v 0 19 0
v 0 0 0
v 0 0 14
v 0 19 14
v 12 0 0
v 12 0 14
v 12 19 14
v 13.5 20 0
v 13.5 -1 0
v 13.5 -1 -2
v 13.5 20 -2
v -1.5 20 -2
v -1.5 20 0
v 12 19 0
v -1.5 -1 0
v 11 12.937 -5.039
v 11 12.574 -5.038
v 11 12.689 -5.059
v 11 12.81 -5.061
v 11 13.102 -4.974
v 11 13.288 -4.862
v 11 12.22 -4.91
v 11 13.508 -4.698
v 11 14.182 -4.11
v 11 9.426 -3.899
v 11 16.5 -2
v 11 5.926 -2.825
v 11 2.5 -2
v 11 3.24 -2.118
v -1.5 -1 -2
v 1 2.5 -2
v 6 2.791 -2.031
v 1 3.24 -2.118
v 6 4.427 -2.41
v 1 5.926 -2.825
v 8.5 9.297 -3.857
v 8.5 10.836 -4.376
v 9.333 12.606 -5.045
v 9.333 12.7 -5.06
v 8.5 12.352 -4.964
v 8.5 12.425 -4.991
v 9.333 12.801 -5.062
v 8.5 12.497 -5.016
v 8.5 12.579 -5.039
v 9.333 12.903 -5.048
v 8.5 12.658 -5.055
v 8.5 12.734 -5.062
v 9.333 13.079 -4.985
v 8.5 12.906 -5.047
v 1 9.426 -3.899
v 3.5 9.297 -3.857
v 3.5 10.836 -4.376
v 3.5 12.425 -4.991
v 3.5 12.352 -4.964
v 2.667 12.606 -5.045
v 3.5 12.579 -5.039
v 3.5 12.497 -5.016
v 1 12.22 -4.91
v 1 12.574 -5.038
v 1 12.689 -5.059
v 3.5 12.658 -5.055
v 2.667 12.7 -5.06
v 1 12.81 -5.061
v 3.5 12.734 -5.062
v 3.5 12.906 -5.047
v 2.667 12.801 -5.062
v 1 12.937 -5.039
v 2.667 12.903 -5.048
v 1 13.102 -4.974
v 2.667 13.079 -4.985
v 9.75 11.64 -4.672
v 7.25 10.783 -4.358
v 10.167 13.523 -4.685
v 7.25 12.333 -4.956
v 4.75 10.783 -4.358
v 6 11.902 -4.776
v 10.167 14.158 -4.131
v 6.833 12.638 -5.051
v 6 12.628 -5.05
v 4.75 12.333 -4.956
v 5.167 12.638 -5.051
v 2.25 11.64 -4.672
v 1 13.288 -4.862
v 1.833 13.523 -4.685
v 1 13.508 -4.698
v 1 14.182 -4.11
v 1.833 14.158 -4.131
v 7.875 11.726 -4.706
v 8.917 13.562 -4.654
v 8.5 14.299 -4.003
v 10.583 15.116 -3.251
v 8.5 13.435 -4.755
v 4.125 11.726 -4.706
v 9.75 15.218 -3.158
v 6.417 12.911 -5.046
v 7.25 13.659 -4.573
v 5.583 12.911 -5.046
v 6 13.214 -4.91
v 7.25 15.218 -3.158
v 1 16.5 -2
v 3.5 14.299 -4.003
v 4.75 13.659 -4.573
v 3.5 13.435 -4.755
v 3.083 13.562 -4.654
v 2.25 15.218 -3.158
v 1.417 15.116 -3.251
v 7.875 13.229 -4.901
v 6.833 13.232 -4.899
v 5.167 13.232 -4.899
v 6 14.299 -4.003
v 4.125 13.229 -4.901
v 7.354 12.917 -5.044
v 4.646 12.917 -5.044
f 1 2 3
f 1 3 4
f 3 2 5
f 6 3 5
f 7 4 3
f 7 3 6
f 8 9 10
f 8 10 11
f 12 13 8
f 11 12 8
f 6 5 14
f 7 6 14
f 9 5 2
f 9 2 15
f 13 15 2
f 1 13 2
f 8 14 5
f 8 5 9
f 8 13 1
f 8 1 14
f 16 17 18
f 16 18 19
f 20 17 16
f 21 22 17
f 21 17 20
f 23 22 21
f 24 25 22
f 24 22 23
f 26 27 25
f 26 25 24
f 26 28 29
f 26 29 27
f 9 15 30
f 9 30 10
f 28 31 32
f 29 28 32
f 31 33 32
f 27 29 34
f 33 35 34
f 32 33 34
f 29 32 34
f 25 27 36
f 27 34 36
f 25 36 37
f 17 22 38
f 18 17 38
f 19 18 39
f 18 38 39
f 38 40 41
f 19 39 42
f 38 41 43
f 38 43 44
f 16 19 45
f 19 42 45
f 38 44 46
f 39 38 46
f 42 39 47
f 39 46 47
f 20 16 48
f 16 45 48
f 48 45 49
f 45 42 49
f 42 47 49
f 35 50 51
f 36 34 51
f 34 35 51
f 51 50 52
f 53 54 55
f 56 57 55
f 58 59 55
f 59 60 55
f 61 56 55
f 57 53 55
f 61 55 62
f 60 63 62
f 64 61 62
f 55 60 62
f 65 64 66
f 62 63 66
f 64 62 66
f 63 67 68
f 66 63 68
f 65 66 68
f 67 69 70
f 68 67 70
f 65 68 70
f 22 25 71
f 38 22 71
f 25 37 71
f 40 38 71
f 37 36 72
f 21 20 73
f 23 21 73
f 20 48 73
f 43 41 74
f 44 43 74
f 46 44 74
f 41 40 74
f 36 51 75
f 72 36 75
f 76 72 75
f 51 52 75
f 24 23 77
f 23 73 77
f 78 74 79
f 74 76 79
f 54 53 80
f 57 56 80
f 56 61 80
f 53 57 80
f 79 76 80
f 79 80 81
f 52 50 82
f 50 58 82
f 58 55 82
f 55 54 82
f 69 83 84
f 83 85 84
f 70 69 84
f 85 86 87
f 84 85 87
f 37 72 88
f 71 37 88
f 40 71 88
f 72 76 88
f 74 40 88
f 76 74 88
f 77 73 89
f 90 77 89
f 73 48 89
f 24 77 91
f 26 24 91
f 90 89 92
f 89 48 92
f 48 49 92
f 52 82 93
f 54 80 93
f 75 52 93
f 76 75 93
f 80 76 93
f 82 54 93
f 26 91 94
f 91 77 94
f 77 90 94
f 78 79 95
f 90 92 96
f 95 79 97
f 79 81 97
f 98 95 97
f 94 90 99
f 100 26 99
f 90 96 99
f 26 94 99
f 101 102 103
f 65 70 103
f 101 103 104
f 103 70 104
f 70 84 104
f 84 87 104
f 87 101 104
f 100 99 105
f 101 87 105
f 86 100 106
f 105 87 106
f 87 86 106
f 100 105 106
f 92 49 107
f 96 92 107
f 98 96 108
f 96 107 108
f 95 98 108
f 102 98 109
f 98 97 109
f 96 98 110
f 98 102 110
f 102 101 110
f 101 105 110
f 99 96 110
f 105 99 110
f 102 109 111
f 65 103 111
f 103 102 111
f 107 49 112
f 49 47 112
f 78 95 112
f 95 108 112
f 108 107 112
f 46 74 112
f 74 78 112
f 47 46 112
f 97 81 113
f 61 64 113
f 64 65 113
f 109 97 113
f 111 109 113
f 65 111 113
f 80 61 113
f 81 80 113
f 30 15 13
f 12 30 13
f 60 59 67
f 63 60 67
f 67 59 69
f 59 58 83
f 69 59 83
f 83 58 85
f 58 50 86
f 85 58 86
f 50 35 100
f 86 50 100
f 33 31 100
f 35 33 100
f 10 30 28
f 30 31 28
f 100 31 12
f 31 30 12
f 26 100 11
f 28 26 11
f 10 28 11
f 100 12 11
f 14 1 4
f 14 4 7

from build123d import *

# Parameters (mm, degrees)
SKETCH1_W           = 12
SKETCH1_H           = 19
BOSS_EXTRUDE1_DEPTH = 14
SKETCH2_W           = 15
SKETCH2_H           = 21
BOSS_EXTRUDE2_DEPTH = 2
BOSS_EXTRUDE3_START = 1
BOSS_EXTRUDE3_DEPTH = 10


with BuildPart() as part:
    # Sketch1 → Boss-Extrude1 (new body)
    with BuildSketch(Plane.XY):
        with Locations((6, 9.5)):
            Rectangle(SKETCH1_W, SKETCH1_H)
    extrude(amount=BOSS_EXTRUDE1_DEPTH)

    # Sketch2 → Boss-Extrude2 (add)
    with BuildSketch(Plane.XY):
        with Locations((6, 9.5)):
            Rectangle(SKETCH2_W, SKETCH2_H)
    extrude(amount=-BOSS_EXTRUDE2_DEPTH)

    # Sketch3 → Boss-Extrude3 (add)
    with BuildSketch(Plane(origin=(0, 0, 0), x_dir=(0, 0, -1), z_dir=(1, 0, 0)).offset(BOSS_EXTRUDE3_START)):
        with BuildLine():
            Line((2, 16.5), (2, 2.5))
            add(Edge.make_bspline(
                [(2, 2.5), (2, 3.412146721), (5.218686286, 14.113667424), (5.401393948, 12.681295538), (2, 16.5)],
                knots=[0, 0, 0, 0, 0.602336799, 1, 1, 1, 1], degree=3))
        make_face()
    extrude(amount=BOSS_EXTRUDE3_DEPTH)


solid = part.part
